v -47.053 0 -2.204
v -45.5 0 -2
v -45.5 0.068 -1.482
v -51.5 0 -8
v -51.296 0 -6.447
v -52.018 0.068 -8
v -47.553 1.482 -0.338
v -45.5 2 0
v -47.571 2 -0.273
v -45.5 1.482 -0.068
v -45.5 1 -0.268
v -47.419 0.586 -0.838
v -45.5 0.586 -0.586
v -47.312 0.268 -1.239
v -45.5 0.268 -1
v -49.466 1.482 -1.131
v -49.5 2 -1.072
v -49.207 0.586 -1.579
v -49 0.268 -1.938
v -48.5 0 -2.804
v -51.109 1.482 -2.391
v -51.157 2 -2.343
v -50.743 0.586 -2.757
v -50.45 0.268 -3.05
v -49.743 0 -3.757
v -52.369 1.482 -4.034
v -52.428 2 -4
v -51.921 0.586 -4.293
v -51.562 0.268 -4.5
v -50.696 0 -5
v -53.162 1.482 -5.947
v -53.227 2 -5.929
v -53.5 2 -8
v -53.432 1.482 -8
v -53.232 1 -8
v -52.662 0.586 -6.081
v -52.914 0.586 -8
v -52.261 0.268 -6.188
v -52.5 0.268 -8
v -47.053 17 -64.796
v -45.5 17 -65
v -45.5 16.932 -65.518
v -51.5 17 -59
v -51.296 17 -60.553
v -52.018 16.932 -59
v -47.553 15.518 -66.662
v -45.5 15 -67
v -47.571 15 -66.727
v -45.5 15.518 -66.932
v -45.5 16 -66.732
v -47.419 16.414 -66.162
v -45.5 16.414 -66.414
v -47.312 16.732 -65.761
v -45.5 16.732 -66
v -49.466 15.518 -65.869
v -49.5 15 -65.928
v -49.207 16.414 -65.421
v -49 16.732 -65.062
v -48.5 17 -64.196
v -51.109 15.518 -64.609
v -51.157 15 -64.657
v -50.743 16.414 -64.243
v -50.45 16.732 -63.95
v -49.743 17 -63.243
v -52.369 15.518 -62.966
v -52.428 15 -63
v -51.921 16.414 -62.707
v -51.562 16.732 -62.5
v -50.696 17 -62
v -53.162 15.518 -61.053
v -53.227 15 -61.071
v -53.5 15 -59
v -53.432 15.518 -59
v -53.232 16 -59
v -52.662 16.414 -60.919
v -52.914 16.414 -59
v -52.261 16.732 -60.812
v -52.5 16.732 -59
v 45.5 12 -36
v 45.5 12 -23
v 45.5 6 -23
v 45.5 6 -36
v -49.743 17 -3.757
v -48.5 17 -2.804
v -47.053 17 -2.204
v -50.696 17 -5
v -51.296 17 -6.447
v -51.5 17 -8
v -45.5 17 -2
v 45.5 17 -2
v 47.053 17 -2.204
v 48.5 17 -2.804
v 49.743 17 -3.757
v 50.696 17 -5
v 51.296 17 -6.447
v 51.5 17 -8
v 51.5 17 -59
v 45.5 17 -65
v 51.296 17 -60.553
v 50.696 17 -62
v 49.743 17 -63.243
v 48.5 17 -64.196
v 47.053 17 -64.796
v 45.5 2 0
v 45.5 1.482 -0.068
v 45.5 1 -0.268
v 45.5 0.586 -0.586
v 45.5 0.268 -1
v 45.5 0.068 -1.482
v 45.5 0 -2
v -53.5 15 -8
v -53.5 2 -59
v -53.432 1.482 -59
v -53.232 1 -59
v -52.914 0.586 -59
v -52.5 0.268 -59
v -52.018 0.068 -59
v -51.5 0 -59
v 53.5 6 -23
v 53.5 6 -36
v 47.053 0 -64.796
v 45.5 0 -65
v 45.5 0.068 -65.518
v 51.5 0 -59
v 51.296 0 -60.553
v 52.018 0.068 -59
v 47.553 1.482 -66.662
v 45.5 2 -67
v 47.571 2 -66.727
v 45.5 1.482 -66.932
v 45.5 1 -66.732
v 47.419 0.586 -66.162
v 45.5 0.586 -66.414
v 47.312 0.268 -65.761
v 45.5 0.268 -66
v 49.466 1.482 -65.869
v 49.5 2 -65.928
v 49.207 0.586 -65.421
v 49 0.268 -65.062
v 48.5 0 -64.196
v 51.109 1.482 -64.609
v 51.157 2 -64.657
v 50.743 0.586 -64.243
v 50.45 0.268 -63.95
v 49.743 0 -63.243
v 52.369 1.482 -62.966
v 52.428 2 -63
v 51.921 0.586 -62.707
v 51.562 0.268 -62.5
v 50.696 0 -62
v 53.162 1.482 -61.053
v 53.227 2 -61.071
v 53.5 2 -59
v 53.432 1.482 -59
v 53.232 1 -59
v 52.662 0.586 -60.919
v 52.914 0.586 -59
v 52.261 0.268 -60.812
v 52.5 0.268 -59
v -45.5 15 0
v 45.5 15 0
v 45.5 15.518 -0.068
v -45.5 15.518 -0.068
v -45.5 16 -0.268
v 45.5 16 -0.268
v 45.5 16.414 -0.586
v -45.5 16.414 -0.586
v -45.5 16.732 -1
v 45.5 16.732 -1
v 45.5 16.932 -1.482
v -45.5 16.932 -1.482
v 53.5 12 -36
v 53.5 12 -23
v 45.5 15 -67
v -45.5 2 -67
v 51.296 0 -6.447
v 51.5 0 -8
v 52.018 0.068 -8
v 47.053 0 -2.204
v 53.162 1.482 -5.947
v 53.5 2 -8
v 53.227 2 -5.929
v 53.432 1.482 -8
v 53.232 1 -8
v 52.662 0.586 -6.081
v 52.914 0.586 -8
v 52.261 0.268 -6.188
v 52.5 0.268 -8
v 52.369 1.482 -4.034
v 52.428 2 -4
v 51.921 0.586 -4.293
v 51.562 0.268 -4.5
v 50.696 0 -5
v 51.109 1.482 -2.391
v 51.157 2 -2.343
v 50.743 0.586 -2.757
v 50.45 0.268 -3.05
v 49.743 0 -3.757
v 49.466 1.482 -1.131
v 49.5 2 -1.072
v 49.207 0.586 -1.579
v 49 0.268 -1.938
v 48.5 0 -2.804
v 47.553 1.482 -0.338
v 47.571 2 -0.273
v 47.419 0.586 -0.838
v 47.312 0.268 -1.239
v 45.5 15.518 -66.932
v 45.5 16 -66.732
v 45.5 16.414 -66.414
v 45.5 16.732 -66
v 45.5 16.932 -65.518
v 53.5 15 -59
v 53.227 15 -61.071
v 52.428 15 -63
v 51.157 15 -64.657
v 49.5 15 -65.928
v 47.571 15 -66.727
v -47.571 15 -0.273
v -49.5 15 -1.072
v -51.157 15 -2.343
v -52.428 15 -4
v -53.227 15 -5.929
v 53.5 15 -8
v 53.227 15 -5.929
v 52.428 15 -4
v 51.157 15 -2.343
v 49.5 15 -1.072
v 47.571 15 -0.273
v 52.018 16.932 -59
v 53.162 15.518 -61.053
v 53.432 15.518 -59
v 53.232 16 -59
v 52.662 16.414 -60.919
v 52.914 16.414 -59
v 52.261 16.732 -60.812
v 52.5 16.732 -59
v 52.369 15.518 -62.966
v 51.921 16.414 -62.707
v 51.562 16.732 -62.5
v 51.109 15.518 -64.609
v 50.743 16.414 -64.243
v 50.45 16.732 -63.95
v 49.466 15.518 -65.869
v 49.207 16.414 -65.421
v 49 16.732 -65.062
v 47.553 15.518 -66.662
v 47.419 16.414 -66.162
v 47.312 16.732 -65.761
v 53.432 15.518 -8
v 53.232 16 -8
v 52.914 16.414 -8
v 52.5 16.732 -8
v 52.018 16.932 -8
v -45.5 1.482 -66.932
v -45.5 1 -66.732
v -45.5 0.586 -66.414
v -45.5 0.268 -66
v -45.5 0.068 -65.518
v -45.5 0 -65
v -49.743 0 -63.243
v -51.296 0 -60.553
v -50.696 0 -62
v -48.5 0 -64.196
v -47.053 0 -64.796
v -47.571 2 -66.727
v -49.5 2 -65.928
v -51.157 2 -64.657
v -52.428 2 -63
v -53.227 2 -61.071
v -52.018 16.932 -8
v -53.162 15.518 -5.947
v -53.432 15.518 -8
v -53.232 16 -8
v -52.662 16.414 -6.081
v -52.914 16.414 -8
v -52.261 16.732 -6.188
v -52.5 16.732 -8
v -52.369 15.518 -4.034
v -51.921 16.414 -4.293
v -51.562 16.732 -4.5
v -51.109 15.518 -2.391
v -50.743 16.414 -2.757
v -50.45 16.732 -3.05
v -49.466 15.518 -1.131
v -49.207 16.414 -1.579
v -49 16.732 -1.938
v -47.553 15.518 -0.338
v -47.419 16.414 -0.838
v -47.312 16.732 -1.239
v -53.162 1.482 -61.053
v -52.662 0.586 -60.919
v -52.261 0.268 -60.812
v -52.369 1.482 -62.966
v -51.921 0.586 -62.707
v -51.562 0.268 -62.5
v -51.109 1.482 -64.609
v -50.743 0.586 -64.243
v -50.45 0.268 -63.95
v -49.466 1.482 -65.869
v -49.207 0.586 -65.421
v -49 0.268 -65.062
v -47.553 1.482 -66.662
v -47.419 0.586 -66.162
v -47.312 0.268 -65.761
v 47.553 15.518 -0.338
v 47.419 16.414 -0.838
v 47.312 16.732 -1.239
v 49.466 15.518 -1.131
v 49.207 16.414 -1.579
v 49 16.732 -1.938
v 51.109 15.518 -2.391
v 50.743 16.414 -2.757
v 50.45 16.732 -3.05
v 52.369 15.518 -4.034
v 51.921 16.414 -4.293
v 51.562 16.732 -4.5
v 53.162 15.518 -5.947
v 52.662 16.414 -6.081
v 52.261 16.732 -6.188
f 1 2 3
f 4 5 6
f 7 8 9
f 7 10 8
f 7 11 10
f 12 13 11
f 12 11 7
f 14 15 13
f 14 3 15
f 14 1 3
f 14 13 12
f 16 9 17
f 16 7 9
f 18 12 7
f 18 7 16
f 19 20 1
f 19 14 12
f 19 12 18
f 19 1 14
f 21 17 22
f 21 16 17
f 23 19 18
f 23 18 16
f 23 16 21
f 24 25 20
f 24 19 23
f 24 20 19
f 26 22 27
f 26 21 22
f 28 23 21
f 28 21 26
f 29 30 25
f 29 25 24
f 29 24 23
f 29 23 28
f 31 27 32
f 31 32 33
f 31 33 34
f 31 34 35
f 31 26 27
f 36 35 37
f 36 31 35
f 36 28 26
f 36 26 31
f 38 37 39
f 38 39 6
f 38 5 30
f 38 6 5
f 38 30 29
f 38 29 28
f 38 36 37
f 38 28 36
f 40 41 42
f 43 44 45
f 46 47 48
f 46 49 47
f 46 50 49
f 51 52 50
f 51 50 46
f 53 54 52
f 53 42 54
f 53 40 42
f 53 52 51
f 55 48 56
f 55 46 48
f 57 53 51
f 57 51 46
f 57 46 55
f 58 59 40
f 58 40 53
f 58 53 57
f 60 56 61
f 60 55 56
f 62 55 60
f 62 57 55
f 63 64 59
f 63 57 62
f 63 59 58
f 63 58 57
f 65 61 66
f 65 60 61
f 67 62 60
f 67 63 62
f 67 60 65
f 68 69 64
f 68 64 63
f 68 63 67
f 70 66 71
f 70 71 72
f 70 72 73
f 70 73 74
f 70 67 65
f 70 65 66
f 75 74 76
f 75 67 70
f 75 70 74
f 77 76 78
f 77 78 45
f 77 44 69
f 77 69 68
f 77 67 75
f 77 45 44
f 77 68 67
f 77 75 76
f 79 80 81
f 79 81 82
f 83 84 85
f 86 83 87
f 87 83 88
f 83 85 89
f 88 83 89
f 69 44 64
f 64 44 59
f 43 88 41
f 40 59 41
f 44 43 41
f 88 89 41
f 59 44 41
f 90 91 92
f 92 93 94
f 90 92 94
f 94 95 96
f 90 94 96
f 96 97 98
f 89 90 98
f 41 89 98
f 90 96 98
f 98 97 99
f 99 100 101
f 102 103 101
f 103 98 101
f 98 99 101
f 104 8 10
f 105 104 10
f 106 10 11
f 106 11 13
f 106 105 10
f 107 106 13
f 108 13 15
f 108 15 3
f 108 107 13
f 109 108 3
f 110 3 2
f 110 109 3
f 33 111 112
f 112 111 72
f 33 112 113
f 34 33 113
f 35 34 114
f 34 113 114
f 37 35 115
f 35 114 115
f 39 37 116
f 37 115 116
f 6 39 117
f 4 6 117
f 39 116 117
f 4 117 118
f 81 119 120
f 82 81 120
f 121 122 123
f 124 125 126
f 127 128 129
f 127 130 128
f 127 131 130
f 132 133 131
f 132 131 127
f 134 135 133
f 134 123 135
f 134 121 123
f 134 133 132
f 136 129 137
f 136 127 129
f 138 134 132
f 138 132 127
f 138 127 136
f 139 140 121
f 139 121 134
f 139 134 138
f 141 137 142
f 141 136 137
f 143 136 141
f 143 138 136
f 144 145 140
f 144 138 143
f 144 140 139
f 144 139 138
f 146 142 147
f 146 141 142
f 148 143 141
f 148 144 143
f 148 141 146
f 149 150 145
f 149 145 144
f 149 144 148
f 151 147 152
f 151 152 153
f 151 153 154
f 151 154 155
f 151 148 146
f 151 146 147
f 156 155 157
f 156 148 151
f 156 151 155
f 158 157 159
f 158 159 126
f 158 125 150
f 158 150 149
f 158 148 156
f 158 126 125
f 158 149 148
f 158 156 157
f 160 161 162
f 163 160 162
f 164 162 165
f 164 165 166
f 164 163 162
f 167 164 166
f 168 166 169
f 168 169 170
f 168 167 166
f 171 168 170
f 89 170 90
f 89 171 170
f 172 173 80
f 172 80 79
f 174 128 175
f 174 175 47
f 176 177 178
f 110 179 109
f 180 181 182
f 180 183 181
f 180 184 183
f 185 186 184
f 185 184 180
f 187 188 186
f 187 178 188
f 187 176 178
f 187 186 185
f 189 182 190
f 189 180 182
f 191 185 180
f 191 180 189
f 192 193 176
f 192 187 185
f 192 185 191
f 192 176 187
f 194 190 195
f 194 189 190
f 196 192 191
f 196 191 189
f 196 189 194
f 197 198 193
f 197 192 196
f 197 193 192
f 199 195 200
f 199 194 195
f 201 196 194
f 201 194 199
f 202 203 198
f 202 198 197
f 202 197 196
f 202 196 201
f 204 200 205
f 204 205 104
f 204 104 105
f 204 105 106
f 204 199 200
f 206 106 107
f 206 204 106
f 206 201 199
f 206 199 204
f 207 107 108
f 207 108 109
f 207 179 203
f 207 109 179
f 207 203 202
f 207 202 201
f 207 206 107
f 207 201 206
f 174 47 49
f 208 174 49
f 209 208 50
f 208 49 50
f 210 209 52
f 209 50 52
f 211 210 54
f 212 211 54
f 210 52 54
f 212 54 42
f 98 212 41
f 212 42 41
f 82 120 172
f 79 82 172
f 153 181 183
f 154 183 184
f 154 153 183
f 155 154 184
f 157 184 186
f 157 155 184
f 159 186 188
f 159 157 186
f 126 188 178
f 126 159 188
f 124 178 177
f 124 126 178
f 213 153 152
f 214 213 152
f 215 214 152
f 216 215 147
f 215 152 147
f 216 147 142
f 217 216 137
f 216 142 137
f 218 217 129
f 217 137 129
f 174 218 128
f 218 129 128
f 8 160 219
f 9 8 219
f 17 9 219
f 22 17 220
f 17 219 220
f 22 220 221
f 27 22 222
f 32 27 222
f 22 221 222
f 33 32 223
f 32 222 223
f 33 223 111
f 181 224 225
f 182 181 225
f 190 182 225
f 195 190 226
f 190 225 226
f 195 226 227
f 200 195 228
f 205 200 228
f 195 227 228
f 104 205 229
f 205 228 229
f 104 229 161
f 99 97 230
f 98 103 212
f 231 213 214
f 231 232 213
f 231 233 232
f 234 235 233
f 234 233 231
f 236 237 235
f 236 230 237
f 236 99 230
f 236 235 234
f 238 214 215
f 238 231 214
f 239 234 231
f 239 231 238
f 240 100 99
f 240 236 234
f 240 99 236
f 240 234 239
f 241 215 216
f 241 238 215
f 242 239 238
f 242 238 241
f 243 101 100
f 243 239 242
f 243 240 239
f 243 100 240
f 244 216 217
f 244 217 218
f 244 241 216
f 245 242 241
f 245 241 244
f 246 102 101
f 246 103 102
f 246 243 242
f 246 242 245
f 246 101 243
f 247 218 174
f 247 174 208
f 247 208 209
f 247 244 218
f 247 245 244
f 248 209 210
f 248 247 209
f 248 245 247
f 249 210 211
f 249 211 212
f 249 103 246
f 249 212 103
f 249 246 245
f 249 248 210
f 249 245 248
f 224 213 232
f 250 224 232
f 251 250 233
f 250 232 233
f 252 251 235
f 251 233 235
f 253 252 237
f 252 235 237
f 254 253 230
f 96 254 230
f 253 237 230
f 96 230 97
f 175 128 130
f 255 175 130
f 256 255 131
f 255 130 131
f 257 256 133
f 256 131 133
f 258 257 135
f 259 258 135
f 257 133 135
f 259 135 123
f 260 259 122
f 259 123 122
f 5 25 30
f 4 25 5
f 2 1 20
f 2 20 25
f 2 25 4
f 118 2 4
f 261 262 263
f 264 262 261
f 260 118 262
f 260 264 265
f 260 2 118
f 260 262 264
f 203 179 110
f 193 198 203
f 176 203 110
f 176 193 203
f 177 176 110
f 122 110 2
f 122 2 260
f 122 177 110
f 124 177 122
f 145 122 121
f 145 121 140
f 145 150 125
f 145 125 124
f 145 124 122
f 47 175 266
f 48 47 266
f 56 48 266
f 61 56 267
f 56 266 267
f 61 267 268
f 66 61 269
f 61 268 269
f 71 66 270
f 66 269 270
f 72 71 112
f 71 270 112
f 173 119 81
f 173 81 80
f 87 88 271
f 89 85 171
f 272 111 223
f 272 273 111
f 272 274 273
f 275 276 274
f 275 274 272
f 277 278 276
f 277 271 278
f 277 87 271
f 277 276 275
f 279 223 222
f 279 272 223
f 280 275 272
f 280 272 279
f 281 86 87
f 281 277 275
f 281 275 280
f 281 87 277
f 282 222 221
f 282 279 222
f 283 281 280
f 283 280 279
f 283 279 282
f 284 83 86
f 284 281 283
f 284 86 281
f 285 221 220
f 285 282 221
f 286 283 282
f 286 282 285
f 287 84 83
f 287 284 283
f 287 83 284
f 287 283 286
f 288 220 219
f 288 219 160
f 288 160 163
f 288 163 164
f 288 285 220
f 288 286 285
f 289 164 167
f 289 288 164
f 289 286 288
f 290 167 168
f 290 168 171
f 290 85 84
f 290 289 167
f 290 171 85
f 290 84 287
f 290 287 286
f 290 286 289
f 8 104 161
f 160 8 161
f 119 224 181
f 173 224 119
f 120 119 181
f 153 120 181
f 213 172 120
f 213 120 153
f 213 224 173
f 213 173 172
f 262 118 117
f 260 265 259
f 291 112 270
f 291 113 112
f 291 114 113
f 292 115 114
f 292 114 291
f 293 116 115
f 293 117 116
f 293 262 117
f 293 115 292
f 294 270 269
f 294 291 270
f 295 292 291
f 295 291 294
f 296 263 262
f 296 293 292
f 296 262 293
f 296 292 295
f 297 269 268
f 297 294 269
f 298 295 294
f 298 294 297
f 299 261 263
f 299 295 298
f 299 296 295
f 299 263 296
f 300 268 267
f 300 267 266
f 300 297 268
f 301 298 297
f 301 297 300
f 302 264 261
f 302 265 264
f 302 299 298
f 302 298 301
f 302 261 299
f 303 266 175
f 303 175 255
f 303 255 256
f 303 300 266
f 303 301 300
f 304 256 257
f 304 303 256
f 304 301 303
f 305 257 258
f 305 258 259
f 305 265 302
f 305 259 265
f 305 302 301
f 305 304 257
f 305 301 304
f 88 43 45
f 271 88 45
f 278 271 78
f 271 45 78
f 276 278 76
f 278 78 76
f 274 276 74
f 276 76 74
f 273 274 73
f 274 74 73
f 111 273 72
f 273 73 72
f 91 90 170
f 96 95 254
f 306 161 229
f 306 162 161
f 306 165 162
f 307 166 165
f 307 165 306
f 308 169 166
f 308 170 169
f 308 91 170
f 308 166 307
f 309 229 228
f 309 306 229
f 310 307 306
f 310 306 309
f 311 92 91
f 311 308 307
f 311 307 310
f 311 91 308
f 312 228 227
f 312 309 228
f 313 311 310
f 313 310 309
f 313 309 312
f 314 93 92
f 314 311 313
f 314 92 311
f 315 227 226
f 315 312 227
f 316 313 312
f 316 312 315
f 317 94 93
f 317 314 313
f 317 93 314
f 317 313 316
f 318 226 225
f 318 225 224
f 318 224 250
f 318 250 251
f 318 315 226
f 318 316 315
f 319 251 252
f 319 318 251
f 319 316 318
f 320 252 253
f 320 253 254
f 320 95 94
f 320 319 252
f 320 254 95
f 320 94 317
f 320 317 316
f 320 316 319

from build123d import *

# Parameters (mm, degrees)
SKETCH1_W           = 67
SKETCH1_H           = 17
BOSS_EXTRUDE1_DEPTH = 53.5
FILLET1_R           = 2
FILLET2_R           = 8
SKETCH2_W           = 13
SKETCH2_H           = 6
CUT_EXTRUDE1_DEPTH  = 8


with BuildPart() as part:
    # Sketch1 → Boss-Extrude1 (new, symmetric)
    with BuildSketch(Plane(origin=(0, 0, 0), x_dir=(0, 0, -1), z_dir=(1, 0, 0))):
        with Locations((33.5, 8.5)):
            Rectangle(SKETCH1_W, SKETCH1_H)
    extrude(amount=BOSS_EXTRUDE1_DEPTH, both=True)

    # Fillet1
    fillet1_edges = [part.edges().sort_by_distance(p)[0] for p in [
        (53.5, 17, -33.5),
        (-53.5, 17, -33.5),
        (-53.5, 0, -33.5),
        (0, 17, 0),
        (0, 17, -67),
        (0, 0, -67),
        (0, 0, 0),
        (53.5, 0, -33.5),
    ]]
    fillet(fillet1_edges, radius=FILLET1_R)

    # Fillet2
    # the kernel refuses this fillet: 8 mm, written as the material it takes off along each edge
    with BuildSketch(Plane(origin=(45.5, 0, -8), x_dir=(1, 0, 0), z_dir=(0, 0, -1))) as fillet2_piece_1:
        with BuildLine():
            CenterArc((6, -2), 2, 0, 90)
            Line((8, -2), (8, 0))
            Line((8, 0), (6, 0))
        make_face()
    revolve(axis=Axis((45.5, 0, -8), (0, -1, 0)), revolution_arc=90, mode=Mode.SUBTRACT)
    with BuildSketch(Plane(origin=(45.5, 0, -59), x_dir=(0, 0, -1), z_dir=(-1, 0, 0))) as fillet2_piece_2:
        with BuildLine():
            CenterArc((6, -2), 2, 0, 90)
            Line((8, -2), (8, 0))
            Line((8, 0), (6, 0))
        make_face()
    revolve(axis=Axis((45.5, 0, -59), (0, -1, 0)), revolution_arc=90, mode=Mode.SUBTRACT)
    with BuildSketch(Plane(origin=(-45.5, 0, -8), x_dir=(0, 0, 1), z_dir=(1, 0, 0))) as fillet2_piece_3:
        with BuildLine():
            CenterArc((6, -2), 2, 0, 90)
            Line((8, -2), (8, 0))
            Line((8, 0), (6, 0))
        make_face()
    revolve(axis=Axis((-45.5, 0, -8), (0, -1, 0)), revolution_arc=90, mode=Mode.SUBTRACT)
    with BuildSketch(Plane(origin=(-45.5, 0, -59), x_dir=(-1, 0, 0), z_dir=(0, 0, 1))) as fillet2_piece_4:
        with BuildLine():
            CenterArc((6, -2), 2, 0, 90)
            Line((8, -2), (8, 0))
            Line((8, 0), (6, 0))
        make_face()
    revolve(axis=Axis((-45.5, 0, -59), (0, -1, 0)), revolution_arc=90, mode=Mode.SUBTRACT)
    with BuildSketch(Plane(origin=(45.5, 17, -59), x_dir=(1, 0, 0), z_dir=(0, 0, 1))) as fillet2_piece_5:
        with BuildLine():
            CenterArc((6, -2), 2, 0, 90)
            Line((8, -2), (8, 0))
            Line((8, 0), (6, 0))
        make_face()
    revolve(axis=Axis((45.5, 17, -59), (0, 1, 0)), revolution_arc=90, mode=Mode.SUBTRACT)
    with BuildSketch(Plane(origin=(45.5, 17, -8), x_dir=(0, 0, 1), z_dir=(-1, 0, 0))) as fillet2_piece_6:
        with BuildLine():
            CenterArc((6, -2), 2, 0, 90)
            Line((8, -2), (8, 0))
            Line((8, 0), (6, 0))
        make_face()
    revolve(axis=Axis((45.5, 17, -8), (0, 1, 0)), revolution_arc=90, mode=Mode.SUBTRACT)
    with BuildSketch(Plane(origin=(-45.5, 17, -59), x_dir=(0, 0, -1), z_dir=(1, 0, 0))) as fillet2_piece_7:
        with BuildLine():
            CenterArc((6, -2), 2, 0, 90)
            Line((8, -2), (8, 0))
            Line((8, 0), (6, 0))
        make_face()
    revolve(axis=Axis((-45.5, 17, -59), (0, 1, 0)), revolution_arc=90, mode=Mode.SUBTRACT)
    with BuildSketch(Plane(origin=(-45.5, 17, -8), x_dir=(-1, 0, 0), z_dir=(0, 0, -1))) as fillet2_piece_8:
        with BuildLine():
            CenterArc((6, -2), 2, 0, 90)
            Line((8, -2), (8, 0))
            Line((8, 0), (6, 0))
        make_face()
    revolve(axis=Axis((-45.5, 17, -8), (0, 1, 0)), revolution_arc=90, mode=Mode.SUBTRACT)
    with BuildSketch(Plane(origin=(-53.5, 17, 0), x_dir=(0, 0, -1), z_dir=(0, -1, 0)), Plane(origin=(-53.5, 0, -67), x_dir=(0, 0, 1), z_dir=(0, 1, 0)), Plane(origin=(53.5, 17, 0), x_dir=(-1, 0, 0), z_dir=(0, -1, 0)), Plane(origin=(53.5, 0, -67), x_dir=(-1, 0, 0), z_dir=(0, 1, 0))) as fillet2_piece_9:
        with BuildLine():
            CenterArc((FILLET2_R, FILLET2_R), FILLET2_R, 180, 90)
            Line((0, FILLET2_R), (0, 0))
            Line((0, 0), (FILLET2_R, 0))
        make_face()
    extrude(amount=17, mode=Mode.SUBTRACT)

    # Sketch2 → Cut-Extrude1 (cut)
    with BuildSketch(Plane(origin=(53.5, 0, 0), x_dir=(0, 0, -1), z_dir=(1, 0, 0))):
        with Locations((29.5, 9)):
            Rectangle(SKETCH2_W, SKETCH2_H)
    extrude(amount=-CUT_EXTRUDE1_DEPTH, mode=Mode.SUBTRACT)


solid = part.part
